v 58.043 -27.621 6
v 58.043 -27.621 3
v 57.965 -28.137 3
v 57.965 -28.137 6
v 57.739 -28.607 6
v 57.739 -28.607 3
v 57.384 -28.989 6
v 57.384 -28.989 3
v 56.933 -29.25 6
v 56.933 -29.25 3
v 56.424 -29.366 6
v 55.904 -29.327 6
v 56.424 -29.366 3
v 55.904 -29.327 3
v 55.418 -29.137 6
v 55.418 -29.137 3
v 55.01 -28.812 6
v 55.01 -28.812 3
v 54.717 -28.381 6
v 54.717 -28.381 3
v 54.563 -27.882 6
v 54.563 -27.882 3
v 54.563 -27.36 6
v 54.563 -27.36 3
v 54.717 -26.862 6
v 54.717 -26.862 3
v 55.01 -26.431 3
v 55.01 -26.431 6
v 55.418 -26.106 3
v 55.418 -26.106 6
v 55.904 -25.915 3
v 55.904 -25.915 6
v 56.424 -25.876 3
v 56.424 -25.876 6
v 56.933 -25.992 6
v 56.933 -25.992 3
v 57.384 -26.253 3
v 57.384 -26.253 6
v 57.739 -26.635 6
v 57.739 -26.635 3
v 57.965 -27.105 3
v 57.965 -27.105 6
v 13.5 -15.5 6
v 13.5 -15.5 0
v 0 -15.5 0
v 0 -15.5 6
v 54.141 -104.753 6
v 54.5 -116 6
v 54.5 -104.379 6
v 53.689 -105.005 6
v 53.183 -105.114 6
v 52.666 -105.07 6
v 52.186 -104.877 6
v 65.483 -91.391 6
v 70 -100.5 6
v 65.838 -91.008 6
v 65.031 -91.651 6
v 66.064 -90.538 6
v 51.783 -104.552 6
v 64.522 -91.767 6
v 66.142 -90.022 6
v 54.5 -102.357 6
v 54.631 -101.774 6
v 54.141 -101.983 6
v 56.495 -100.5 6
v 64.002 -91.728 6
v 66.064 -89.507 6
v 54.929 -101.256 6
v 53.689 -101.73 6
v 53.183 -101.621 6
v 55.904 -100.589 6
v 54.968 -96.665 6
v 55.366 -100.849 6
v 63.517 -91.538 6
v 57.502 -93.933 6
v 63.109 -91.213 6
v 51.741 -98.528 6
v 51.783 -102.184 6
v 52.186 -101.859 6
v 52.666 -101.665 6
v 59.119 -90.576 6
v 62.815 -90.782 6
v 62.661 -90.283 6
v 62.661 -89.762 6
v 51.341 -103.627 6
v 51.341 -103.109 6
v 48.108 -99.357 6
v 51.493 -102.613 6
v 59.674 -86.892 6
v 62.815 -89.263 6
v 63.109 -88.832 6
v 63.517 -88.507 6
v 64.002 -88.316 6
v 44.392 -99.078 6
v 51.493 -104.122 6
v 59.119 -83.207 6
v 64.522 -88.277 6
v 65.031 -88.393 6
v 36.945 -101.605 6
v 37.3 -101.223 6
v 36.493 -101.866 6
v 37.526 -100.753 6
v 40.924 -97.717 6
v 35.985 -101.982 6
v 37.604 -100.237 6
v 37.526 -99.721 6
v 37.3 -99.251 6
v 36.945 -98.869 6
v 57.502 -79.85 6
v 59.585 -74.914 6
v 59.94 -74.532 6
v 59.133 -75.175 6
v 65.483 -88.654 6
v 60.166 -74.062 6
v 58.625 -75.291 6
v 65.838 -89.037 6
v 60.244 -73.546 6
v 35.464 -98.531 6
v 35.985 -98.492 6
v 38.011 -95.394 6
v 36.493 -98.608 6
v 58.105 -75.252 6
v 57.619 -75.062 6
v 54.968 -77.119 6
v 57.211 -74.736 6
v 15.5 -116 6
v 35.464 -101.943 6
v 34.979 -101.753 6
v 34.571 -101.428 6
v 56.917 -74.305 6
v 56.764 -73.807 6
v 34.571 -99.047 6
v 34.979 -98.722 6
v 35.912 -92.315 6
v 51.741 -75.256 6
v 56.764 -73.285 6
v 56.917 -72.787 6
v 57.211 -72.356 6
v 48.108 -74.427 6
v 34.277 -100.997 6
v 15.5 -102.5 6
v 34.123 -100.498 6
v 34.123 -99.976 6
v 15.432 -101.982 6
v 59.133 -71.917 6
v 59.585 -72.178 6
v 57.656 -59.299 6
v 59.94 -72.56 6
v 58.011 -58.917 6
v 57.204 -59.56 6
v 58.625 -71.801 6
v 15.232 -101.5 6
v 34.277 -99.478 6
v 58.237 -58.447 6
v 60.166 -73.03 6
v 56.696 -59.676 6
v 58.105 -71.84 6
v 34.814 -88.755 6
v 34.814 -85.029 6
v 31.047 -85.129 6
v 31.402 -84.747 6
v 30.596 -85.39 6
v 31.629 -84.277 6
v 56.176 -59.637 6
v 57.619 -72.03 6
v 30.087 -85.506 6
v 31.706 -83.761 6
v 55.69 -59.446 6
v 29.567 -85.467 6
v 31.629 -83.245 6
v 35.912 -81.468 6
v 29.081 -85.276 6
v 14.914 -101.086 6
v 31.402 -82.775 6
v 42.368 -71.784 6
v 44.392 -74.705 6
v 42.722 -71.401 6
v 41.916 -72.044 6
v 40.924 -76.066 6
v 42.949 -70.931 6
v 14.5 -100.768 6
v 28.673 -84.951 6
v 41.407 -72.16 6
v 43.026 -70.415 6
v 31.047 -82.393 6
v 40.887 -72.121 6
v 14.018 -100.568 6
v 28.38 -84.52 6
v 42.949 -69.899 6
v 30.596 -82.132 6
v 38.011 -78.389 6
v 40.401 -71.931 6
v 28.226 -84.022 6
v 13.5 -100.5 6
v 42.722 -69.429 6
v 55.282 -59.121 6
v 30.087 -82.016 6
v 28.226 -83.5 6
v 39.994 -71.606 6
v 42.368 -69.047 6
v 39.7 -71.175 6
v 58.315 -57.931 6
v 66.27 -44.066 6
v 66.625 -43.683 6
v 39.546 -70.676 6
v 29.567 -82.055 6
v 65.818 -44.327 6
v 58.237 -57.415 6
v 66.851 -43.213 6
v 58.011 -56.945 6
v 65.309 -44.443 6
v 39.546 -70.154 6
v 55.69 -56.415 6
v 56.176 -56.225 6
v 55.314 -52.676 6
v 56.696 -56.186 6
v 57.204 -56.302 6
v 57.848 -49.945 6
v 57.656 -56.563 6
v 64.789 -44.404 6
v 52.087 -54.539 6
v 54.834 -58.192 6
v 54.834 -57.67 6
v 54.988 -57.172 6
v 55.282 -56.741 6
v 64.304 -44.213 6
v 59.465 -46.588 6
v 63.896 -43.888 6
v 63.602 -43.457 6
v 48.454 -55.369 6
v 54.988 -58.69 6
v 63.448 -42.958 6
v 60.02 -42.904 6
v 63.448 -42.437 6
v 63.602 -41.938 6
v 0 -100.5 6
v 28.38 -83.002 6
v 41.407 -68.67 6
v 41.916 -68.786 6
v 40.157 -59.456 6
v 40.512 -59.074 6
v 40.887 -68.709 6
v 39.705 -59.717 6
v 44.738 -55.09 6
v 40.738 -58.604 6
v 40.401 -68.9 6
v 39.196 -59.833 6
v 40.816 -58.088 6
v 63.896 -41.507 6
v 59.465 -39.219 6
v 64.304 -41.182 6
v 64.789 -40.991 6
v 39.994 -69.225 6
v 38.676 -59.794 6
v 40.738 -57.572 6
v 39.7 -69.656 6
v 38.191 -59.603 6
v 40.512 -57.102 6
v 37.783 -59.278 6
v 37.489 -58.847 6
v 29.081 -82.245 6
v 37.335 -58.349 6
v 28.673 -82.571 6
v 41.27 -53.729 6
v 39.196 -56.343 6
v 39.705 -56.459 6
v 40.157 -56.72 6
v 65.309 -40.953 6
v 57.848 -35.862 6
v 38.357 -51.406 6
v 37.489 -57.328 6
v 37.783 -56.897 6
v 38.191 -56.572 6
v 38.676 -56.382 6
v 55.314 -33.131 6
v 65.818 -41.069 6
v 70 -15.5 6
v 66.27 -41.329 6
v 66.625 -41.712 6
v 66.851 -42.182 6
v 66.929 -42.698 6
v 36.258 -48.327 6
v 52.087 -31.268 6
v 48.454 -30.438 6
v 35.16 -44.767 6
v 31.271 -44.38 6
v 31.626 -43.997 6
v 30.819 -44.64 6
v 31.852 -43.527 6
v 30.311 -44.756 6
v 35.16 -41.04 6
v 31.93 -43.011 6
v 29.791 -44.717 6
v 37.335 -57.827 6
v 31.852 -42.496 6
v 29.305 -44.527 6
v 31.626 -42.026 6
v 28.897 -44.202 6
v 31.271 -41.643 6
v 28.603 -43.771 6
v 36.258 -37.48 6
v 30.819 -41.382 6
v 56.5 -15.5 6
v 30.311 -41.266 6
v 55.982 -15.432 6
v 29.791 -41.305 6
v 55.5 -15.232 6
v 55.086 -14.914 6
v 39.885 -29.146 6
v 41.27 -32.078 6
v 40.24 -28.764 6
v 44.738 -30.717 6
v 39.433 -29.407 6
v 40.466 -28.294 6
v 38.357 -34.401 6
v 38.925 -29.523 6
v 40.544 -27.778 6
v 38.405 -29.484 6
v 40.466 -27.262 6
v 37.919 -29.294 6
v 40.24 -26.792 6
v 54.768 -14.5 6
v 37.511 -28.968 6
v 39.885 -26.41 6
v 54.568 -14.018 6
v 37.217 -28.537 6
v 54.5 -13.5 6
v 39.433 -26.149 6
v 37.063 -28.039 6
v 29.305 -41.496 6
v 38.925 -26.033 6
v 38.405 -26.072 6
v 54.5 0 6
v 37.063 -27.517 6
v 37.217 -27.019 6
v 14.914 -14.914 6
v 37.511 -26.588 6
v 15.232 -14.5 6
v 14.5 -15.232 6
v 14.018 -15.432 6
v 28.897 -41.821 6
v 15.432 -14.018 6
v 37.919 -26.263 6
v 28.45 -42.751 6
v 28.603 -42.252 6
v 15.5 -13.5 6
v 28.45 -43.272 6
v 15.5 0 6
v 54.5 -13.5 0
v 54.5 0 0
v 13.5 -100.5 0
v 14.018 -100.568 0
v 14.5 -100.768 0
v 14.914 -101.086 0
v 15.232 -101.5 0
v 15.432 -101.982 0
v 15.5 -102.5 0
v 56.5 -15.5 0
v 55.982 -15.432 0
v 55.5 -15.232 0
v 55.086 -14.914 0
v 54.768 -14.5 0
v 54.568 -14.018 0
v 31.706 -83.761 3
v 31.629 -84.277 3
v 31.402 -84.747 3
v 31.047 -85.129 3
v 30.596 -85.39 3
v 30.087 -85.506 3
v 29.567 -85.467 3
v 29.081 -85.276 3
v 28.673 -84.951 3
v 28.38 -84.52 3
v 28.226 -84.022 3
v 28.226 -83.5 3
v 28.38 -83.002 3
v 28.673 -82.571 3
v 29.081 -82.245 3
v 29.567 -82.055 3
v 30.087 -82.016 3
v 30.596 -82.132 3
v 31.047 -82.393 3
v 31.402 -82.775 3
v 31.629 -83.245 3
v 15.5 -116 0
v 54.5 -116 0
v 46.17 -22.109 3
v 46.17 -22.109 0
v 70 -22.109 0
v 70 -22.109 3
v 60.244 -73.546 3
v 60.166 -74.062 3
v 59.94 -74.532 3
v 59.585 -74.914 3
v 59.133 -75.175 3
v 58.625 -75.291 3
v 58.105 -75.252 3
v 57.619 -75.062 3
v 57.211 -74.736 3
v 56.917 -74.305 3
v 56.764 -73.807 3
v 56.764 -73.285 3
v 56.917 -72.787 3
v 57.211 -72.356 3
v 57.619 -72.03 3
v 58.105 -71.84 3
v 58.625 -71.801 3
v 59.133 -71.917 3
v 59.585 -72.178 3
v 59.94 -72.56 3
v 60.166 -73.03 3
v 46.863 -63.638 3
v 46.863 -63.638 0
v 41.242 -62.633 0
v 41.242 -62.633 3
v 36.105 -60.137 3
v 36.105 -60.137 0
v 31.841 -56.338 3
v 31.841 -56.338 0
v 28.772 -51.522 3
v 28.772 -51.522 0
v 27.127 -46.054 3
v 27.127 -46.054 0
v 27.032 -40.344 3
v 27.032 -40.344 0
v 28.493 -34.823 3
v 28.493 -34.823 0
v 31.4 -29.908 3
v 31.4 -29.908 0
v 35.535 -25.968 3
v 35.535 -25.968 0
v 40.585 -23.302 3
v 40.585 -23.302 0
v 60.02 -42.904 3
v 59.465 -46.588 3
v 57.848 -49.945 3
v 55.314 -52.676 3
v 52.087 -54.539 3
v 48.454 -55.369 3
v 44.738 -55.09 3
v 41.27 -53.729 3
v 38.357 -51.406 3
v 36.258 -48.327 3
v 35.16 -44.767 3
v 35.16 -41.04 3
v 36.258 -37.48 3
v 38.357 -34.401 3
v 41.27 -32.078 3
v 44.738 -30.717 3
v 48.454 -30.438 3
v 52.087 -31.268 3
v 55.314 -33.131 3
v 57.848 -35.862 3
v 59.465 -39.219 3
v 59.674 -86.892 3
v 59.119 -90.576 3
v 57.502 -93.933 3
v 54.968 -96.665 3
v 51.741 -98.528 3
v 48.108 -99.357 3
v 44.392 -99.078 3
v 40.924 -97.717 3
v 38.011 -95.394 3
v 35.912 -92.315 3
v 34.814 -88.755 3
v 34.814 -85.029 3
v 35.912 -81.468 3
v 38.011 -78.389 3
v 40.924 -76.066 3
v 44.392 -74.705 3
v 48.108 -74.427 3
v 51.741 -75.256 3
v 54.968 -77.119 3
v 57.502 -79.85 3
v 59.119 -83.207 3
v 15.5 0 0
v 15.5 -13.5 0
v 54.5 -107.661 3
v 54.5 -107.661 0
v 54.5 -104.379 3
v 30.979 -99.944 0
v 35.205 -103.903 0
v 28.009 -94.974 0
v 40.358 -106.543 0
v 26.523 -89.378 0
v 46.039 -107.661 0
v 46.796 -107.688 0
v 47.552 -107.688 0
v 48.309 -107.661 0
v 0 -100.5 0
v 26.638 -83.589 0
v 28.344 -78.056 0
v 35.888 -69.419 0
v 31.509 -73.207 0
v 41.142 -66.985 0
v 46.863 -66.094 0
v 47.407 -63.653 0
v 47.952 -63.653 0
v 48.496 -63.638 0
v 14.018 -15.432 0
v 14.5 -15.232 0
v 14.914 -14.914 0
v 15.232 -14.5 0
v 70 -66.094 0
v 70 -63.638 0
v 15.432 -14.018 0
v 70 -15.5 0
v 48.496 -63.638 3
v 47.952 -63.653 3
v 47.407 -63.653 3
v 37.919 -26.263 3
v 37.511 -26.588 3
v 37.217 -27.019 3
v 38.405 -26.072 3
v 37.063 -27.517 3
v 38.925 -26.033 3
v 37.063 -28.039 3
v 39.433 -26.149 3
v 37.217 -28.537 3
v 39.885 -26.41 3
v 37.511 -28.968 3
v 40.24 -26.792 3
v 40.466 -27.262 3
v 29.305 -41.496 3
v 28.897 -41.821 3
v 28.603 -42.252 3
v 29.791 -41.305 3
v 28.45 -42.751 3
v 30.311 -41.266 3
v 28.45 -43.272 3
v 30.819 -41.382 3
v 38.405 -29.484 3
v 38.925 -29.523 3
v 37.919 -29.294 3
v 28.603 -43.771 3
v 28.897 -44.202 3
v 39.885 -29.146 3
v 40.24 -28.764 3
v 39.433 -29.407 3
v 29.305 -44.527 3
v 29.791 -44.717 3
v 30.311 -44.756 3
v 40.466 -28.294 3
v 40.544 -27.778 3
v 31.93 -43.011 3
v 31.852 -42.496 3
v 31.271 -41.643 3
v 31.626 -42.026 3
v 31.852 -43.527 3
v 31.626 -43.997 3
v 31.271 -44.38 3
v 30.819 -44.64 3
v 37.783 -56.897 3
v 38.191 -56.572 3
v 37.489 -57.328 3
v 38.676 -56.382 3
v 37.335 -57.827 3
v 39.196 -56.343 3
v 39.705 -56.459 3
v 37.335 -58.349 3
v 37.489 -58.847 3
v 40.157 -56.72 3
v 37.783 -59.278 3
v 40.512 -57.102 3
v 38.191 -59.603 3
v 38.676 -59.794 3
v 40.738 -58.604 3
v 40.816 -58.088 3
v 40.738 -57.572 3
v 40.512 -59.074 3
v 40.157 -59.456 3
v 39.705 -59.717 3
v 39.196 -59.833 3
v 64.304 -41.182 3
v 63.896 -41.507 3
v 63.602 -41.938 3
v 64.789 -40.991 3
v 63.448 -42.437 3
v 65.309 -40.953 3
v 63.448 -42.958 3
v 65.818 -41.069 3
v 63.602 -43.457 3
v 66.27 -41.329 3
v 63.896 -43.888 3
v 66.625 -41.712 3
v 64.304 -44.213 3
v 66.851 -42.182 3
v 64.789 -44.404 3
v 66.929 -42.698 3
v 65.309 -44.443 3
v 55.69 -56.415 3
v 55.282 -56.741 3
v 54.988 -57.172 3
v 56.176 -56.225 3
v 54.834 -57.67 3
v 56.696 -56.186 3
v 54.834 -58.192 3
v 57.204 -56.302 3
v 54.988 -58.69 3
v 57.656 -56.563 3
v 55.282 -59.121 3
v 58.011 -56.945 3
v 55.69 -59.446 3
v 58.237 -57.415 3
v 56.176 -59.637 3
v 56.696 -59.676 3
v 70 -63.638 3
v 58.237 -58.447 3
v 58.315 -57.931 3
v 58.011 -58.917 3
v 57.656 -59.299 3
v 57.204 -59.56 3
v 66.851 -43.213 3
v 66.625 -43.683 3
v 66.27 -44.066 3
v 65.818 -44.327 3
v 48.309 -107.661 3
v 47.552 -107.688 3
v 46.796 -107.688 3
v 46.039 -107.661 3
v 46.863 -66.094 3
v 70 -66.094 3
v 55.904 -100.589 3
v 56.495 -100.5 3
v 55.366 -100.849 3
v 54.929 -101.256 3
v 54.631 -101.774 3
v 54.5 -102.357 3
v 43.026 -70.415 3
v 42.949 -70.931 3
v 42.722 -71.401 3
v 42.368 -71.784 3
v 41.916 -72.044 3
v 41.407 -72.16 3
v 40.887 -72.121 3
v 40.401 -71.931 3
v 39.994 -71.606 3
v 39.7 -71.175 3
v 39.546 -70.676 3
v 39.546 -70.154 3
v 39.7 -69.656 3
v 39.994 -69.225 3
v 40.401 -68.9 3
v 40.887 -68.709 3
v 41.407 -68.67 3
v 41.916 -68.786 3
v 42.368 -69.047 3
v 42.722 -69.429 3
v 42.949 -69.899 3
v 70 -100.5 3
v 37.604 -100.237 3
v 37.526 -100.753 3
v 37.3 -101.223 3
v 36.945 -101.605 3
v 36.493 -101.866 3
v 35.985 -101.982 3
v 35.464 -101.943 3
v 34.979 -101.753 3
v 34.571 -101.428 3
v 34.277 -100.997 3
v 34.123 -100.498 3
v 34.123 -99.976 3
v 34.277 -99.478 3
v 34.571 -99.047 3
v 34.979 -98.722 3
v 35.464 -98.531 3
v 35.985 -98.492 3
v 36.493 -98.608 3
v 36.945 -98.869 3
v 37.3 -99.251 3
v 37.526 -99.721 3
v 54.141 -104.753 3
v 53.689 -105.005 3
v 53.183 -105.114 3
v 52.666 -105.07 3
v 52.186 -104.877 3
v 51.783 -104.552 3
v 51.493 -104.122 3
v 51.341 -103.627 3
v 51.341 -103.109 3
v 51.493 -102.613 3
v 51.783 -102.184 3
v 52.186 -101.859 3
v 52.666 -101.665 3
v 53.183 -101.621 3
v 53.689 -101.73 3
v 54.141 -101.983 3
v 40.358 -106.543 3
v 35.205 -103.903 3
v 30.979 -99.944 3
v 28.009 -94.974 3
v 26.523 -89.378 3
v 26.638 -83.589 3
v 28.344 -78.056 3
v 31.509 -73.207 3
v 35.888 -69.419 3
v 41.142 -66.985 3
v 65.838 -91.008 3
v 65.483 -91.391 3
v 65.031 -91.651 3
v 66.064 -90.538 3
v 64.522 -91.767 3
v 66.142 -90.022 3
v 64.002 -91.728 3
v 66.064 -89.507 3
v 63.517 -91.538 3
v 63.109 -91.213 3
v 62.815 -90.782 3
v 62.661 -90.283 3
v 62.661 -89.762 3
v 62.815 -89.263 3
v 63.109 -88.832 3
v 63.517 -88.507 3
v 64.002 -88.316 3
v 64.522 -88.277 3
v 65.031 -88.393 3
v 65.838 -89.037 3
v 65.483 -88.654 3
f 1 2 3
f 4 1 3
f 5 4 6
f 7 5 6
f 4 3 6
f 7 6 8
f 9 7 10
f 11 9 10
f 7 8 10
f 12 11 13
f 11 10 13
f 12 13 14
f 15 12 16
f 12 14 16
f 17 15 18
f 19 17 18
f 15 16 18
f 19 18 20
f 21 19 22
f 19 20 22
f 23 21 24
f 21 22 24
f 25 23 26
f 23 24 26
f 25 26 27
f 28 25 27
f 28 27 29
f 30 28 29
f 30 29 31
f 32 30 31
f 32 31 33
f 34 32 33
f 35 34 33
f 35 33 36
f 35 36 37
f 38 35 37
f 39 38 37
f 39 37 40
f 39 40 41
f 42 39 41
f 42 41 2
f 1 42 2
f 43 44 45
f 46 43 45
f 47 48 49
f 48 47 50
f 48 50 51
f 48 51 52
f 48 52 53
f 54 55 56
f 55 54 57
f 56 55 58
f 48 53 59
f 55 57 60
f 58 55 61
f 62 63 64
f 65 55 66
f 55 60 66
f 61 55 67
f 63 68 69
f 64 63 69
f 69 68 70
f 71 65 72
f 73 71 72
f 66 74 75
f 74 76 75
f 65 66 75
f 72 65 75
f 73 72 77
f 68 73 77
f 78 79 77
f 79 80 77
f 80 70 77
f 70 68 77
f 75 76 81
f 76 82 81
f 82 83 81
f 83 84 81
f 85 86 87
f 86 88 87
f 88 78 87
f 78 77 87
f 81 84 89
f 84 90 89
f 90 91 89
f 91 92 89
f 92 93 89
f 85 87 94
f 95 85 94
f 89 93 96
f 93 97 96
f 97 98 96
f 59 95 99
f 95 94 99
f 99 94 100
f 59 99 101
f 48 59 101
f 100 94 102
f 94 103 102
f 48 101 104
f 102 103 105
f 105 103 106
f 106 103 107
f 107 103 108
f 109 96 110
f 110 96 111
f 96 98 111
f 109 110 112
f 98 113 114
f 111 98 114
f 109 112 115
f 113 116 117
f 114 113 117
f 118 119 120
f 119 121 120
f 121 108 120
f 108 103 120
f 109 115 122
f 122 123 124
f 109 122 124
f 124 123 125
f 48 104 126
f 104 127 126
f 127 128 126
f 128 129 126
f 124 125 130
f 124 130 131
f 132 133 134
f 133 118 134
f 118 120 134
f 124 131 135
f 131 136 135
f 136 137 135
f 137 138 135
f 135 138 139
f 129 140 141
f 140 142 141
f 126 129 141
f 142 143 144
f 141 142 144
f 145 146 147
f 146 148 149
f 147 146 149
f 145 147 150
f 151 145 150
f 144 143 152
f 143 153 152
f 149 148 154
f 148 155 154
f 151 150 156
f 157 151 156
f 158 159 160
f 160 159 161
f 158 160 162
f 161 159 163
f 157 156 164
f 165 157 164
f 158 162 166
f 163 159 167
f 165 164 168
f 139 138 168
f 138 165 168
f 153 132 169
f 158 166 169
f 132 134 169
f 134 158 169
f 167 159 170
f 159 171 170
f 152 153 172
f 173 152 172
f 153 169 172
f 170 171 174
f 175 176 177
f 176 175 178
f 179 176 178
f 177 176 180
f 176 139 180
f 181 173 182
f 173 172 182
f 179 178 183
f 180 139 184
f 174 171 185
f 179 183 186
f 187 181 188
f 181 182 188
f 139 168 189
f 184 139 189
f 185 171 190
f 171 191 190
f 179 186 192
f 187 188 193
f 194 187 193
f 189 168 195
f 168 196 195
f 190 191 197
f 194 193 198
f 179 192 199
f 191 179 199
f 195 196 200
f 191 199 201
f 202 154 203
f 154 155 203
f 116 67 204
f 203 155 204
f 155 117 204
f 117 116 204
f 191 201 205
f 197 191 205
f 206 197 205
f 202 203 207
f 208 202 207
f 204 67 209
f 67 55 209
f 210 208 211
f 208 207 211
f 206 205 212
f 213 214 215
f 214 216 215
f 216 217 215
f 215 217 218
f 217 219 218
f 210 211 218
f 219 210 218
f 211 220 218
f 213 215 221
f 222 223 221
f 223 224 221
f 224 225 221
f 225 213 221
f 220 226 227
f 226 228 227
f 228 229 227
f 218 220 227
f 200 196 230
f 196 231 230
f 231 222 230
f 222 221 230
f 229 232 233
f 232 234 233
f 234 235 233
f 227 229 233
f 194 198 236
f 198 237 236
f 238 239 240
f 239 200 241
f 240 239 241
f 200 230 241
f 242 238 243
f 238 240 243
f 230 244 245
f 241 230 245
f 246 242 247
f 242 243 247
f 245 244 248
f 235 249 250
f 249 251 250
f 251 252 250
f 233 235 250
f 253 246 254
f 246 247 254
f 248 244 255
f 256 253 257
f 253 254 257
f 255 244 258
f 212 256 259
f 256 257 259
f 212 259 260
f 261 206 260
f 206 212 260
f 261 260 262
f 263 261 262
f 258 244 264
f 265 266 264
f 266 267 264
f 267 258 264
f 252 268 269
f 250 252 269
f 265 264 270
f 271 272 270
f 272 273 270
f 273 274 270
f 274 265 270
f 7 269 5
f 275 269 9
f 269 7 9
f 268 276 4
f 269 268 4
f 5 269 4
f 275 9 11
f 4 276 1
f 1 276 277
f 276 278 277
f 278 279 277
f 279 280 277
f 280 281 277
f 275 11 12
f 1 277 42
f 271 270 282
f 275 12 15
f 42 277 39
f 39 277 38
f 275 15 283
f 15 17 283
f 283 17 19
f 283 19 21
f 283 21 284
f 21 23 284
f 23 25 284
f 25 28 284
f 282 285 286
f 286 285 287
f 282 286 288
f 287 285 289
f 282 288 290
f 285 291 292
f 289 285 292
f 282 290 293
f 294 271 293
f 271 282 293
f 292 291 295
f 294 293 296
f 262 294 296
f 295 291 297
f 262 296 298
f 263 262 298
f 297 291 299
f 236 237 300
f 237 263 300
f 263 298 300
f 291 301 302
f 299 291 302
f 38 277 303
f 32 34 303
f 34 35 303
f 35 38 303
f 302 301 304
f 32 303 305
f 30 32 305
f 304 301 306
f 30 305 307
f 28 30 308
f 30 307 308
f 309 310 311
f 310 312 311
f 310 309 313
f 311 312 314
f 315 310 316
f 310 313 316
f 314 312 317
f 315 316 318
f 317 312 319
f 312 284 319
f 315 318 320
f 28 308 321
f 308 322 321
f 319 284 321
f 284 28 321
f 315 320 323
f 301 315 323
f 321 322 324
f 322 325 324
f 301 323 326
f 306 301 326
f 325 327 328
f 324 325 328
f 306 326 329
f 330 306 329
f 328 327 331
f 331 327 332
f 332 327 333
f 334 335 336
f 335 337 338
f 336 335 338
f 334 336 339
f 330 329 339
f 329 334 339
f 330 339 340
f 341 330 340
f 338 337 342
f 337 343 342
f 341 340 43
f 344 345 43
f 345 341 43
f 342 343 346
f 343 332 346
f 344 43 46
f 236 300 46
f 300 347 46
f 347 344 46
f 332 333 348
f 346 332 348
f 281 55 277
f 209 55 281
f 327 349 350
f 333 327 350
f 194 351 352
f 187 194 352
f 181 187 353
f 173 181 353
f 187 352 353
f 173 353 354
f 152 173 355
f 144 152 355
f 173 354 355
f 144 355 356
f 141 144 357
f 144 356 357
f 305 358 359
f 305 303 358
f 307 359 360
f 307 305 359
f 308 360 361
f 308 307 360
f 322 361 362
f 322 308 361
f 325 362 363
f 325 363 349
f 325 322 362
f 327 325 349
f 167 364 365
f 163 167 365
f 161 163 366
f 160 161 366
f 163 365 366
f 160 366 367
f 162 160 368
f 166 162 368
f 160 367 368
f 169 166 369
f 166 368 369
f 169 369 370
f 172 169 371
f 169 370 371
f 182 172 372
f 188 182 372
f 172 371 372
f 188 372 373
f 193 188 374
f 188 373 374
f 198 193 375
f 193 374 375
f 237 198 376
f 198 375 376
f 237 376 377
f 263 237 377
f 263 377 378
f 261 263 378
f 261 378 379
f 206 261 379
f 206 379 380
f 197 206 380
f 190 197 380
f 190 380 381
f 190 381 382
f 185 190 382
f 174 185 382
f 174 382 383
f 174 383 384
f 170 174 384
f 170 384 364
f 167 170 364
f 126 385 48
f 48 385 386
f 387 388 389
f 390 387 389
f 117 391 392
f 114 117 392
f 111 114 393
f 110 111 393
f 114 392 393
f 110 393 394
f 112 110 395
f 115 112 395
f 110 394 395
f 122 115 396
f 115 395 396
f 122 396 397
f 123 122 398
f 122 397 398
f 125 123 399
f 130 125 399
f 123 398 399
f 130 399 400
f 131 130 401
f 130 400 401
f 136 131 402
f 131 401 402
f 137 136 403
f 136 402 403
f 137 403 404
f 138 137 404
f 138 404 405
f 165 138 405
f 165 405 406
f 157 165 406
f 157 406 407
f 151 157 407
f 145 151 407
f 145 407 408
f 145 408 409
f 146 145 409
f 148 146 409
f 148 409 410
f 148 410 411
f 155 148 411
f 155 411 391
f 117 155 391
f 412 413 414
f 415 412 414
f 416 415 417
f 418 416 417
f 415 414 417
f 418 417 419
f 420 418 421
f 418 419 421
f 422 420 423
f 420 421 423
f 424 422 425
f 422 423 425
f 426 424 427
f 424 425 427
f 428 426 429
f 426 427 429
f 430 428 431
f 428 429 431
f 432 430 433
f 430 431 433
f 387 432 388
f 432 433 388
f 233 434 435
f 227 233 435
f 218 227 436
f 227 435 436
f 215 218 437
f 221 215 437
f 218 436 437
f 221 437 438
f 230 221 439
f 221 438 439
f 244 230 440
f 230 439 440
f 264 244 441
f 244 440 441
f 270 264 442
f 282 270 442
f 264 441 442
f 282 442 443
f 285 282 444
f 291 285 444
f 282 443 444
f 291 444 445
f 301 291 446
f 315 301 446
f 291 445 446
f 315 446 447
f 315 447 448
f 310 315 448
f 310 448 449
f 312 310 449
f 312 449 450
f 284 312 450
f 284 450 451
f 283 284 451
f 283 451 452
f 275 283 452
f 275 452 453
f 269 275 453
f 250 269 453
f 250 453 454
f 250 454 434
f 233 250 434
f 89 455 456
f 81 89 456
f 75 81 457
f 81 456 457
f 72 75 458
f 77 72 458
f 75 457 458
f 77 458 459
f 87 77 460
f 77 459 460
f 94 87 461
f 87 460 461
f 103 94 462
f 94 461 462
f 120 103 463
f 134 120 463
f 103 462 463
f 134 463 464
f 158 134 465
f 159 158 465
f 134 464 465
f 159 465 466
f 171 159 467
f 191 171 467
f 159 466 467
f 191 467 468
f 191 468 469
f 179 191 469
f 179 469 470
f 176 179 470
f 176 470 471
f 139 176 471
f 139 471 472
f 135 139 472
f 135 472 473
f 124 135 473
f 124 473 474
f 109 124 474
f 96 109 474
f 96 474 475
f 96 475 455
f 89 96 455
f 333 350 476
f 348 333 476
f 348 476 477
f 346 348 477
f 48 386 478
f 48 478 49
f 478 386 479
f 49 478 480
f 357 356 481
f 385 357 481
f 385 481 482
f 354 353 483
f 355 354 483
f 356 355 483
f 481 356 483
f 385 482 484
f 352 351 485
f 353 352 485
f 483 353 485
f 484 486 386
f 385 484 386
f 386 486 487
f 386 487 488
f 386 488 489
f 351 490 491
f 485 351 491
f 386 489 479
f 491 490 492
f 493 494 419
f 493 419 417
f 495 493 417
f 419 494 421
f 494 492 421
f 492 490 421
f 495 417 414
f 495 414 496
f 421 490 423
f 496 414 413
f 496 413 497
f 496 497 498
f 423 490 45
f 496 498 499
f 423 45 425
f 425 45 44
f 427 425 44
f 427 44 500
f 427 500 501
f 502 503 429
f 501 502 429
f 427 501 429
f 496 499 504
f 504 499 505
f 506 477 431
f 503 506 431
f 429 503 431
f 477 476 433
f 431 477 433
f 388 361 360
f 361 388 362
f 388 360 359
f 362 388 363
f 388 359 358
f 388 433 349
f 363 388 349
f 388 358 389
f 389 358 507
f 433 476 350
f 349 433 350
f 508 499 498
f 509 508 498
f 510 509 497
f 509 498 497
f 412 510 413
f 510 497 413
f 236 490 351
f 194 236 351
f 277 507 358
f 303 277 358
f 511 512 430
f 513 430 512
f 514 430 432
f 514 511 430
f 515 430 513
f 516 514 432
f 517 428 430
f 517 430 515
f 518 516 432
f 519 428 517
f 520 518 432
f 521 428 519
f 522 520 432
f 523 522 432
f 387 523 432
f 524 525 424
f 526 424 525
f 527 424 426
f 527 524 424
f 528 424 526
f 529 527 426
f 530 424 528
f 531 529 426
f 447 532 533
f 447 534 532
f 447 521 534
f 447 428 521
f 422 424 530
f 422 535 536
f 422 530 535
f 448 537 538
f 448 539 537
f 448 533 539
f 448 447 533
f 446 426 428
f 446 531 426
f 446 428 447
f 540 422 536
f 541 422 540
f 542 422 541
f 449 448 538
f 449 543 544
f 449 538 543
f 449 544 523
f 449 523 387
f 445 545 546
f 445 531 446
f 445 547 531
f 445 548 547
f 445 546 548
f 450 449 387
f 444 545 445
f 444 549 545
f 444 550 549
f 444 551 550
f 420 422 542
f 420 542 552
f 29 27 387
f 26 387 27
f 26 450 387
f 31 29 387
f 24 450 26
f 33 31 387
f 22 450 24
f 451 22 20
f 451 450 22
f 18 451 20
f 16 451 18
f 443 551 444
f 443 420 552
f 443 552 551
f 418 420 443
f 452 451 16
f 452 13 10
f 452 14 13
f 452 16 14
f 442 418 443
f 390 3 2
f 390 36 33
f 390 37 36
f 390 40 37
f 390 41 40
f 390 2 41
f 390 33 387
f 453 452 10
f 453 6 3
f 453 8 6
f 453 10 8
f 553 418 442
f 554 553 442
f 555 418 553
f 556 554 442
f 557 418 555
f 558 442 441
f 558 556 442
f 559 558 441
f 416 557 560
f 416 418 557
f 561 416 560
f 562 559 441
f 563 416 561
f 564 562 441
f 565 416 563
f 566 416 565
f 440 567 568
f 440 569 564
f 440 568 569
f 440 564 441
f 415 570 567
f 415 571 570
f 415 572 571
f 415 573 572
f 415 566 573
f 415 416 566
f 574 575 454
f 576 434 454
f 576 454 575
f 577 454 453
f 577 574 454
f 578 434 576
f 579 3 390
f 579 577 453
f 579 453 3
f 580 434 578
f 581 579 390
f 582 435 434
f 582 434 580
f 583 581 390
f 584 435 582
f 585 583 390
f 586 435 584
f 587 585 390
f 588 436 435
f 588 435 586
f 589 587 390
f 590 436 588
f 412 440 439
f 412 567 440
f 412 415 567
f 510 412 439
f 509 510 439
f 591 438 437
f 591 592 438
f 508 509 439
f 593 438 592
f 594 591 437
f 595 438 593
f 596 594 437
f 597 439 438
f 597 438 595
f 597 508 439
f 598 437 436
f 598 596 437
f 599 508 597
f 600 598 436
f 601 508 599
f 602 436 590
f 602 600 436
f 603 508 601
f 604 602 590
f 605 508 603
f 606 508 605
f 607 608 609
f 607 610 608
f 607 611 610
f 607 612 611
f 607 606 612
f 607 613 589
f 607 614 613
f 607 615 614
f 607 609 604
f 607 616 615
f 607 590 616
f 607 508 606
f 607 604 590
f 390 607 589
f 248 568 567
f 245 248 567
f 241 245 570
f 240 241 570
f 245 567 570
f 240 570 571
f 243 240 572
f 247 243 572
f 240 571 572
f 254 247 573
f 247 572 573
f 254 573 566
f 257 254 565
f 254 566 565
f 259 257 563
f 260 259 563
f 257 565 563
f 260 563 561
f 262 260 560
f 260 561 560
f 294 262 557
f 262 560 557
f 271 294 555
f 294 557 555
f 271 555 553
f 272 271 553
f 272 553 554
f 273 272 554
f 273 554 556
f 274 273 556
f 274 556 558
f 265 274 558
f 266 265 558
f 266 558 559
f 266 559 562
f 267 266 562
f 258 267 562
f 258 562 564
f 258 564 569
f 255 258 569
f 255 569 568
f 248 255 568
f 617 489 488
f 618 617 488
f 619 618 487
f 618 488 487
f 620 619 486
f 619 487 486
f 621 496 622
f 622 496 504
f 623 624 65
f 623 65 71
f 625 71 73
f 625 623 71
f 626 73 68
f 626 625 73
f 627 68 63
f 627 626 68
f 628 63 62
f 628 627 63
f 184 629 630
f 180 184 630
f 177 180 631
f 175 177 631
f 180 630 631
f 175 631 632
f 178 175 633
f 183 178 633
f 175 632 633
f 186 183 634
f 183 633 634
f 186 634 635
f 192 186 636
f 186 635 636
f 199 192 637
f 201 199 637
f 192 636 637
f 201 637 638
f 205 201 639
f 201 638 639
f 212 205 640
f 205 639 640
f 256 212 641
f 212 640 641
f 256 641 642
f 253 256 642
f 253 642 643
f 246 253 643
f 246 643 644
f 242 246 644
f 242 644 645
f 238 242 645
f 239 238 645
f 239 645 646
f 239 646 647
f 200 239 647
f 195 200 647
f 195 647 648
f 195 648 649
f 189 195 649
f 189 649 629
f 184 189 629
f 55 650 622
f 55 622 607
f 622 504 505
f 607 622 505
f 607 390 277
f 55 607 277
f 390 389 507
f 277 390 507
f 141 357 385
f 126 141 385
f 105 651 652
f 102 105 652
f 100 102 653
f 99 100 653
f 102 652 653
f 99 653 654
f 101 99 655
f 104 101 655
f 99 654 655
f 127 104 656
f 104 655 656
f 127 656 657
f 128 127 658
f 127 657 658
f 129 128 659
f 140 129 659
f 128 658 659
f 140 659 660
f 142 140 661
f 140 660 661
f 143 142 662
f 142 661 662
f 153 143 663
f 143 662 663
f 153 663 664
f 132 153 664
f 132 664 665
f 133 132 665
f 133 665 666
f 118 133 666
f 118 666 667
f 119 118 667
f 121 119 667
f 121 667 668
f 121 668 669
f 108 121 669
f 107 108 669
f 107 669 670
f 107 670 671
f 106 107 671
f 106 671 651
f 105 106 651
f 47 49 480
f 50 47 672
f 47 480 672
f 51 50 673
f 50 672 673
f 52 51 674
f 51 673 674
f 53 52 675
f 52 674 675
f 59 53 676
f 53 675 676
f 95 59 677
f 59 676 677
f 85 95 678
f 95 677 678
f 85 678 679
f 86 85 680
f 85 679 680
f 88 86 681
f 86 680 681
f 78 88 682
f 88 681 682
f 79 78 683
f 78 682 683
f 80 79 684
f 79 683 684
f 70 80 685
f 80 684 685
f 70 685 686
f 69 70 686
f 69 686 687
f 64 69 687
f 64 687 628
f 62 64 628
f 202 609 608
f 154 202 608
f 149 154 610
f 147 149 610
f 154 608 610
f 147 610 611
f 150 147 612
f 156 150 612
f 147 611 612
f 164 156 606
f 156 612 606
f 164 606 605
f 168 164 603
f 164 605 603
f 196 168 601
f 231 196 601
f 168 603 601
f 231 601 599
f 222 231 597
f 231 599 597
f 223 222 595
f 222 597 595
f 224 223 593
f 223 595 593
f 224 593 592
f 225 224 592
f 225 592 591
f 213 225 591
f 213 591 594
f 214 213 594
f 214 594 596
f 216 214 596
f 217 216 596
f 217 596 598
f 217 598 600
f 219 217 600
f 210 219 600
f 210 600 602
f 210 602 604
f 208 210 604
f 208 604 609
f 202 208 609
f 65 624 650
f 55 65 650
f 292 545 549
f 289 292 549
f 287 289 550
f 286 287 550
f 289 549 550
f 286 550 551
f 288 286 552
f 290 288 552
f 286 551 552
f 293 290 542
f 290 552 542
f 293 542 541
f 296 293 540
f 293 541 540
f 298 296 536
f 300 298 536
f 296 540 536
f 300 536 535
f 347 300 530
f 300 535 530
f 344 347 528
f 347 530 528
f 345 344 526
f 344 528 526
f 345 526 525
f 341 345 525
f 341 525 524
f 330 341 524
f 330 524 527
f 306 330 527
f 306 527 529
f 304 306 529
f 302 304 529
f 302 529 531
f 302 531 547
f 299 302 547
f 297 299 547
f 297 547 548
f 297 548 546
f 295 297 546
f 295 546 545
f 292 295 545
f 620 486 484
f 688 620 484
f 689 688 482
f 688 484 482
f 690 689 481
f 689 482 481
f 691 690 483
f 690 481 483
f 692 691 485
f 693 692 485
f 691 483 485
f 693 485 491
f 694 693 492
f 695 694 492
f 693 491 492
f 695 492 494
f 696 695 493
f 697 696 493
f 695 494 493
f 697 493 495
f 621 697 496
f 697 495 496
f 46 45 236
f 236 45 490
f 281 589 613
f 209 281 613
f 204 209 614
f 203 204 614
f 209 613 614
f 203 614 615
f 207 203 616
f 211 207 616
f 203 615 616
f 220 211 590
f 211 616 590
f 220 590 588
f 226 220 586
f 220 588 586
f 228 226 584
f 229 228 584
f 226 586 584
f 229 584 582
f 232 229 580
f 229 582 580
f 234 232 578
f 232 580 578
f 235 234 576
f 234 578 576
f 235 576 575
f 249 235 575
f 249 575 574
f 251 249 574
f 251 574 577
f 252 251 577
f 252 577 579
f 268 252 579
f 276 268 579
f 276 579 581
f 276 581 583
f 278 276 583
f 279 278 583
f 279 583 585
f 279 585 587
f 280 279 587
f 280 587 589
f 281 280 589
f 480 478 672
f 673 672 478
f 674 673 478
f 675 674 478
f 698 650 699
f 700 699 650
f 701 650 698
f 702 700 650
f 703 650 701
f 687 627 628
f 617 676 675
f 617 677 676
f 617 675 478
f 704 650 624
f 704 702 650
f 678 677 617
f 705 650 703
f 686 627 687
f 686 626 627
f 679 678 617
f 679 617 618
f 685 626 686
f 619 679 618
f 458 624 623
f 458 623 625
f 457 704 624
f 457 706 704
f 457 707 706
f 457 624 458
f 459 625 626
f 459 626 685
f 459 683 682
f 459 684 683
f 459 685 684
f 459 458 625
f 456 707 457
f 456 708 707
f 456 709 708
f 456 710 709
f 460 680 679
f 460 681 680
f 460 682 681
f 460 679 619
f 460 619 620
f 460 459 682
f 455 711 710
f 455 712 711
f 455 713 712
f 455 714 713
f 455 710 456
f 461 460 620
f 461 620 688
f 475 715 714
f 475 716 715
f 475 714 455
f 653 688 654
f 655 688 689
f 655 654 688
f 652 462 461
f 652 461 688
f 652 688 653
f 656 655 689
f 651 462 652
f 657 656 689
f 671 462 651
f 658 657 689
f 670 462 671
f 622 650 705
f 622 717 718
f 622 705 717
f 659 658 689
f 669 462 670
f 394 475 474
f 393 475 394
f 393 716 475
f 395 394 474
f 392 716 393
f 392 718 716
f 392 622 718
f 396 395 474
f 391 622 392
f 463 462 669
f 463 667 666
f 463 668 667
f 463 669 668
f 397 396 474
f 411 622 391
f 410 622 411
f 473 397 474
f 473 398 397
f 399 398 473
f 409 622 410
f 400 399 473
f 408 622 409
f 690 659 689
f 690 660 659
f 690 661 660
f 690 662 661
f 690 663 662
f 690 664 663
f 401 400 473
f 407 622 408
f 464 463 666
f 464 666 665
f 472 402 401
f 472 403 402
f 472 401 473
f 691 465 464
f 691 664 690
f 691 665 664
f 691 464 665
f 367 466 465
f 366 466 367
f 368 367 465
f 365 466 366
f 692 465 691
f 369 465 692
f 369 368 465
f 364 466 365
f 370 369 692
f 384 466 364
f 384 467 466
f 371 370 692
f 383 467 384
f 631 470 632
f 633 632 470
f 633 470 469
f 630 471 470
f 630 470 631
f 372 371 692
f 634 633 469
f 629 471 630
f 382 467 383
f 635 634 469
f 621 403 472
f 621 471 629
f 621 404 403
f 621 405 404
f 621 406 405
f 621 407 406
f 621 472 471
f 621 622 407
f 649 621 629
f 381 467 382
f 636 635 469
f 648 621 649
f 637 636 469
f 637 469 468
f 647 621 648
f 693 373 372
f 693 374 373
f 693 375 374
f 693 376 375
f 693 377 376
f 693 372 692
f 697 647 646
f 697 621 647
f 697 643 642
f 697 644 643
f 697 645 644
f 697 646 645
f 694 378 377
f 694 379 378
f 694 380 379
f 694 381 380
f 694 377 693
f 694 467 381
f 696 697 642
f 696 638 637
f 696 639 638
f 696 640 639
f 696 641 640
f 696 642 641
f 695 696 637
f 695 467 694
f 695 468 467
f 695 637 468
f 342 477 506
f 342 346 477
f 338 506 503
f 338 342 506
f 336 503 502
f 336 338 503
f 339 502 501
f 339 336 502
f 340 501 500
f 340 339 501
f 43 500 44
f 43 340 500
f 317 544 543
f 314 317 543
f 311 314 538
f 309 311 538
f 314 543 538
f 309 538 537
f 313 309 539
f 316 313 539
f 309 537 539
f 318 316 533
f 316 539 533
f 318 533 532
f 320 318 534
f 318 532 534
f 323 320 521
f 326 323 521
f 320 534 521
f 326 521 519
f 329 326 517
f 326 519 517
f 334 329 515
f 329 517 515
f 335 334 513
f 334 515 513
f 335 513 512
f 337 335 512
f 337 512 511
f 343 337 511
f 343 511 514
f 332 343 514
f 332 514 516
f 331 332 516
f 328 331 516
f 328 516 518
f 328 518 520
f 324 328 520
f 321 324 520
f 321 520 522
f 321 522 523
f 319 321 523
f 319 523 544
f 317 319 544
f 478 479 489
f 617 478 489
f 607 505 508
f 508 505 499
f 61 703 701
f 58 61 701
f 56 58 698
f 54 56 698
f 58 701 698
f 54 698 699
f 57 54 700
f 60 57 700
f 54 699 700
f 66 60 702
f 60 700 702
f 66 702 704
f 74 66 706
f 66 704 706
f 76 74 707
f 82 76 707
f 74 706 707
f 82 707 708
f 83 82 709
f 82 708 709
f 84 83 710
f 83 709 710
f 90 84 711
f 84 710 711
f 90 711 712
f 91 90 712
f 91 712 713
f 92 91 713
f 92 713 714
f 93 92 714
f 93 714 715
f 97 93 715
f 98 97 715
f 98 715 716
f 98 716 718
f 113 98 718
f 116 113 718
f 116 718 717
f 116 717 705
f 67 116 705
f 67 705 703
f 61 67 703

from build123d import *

# Parameters (mm, degrees)
F1_DEPTH     = 6
F3_DEPTH     = 3
F4_R         = 12.5
F5_DEPTH     = 25
F6_R         = 1.75
F7_DEPTH     = 25
F8_R         = 1.75
F9_DEPTH     = 25
F10_T1_DEPTH = 6
F10_T3_DEPTH = 3
F11_R        = 2


# Not quite as in the source:
# - a fillet or chamfer that OpenCascade refuses, or shapes differently, is made with other operations: its cross-section is extruded or revolved along the edge and cut away or added


with BuildPart() as f1:
    # F0 (on Top) → F1 (new body)
    with BuildSketch(Plane.XY):
        Polygon((15.5, -15.5), (0, -15.5), (0, -100.5), (15.5, -100.5), (15.5, -116), (54.5, -116), (54.5, -100.5), (70, -100.5), (70, -15.5), (54.5, -15.5), (54.5, 0), (15.5, 0), align=None)
    extrude(amount=F1_DEPTH)

    # F2 (on face) → F3 (cut)
    with BuildSketch(Plane(origin=(0, 0, 0), x_dir=(1, 0, 0), z_dir=(0, 0, -1))):
        with BuildLine():
            Line((46.0390912639, 107.6606247352), (48.3088987836, 107.6606247352))
            ThreePointArc((48.3088987836, 107.6606247352), (47.1739950237, 107.6916095092), (46.0390912639, 107.6606247352))
        make_face()
        with BuildLine():
            Line((46.863162711, 63.6384694919), (48.4956821186, 63.6384694919))
            ThreePointArc((48.4956821186, 63.6384694919), (47.6794224148, 63.6544920069), (46.863162711, 63.6384694919))
        make_face()
        with BuildLine():
            Line((54.5, 107.6606247352), (48.3088987836, 107.6606247352))
            Line((48.3088987836, 107.6606247352), (46.0390912639, 107.6606247352))
            ThreePointArc((46.0390912639, 107.6606247352), (26.3780814544, 86.4793246358), (46.863162711, 66.0939321564))
            Line((46.863162711, 66.0939321564), (70, 66.0939321564))
            Line((70, 66.0939321564), (70, 100.5))
            Line((70, 100.5), (54.5, 100.5))
            Line((54.5, 100.5), (54.5, 107.6606247352))
        make_face()
        with BuildLine():
            Line((70, 22.1093658845), (70, 63.6384694919))
            Line((70, 63.6384694919), (48.4956821186, 63.6384694919))
            Line((48.4956821186, 63.6384694919), (46.863162711, 63.6384694919))
            ThreePointArc((46.863162711, 63.6384694919), (26.8823229814, 43.2018465212), (46.1695409076, 22.1093658845))
            Line((46.1695409076, 22.1093658845), (70, 22.1093658845))
        make_face()
    extrude(amount=-F3_DEPTH, mode=Mode.SUBTRACT)

    # F4 (on face) → F5 (cut)
    with BuildSketch(Plane(origin=(0, 0, 3), x_dir=(1, 0, 0), z_dir=(0, 0, -1))):
        with Locations((47.51990363, 42.9035276175)):
            Circle(F4_R)
        with Locations((47.1739950237, 86.8916095092)):
            Circle(F4_R)
    extrude(amount=-F5_DEPTH, mode=Mode.SUBTRACT)

    # F6 (on face) → F7 (cut)
    with BuildSketch(Plane(origin=(0, 0, 3), x_dir=(1, 0, 0), z_dir=(0, 0, -1))):
        with Locations((39.0656358559, 58.0877674629)):
            Circle(F6_R)
        with Locations((30.1801256076, 43.0113717521)):
            Circle(F6_R)
        with Locations((38.7939121665, 27.7780962961)):
            Circle(F6_R)
        with Locations((56.2932089737, 27.6212165509)):
            Circle(F6_R)
        with Locations((65.178719222, 42.6976122617)):
            Circle(F6_R)
        with Locations((56.5649326631, 57.9308877176)):
            Circle(F6_R)
    extrude(amount=-F7_DEPTH, mode=Mode.SUBTRACT)

    # F8 (on face) → F9 (cut)
    with BuildSketch(Plane(origin=(0, 0, 3), x_dir=(1, 0, 0), z_dir=(0, 0, -1))):
        with Locations((35.8538748382, 100.2372035006)):
            Circle(F8_R)
        with Locations((29.9563115058, 83.7608948503)):
            Circle(F8_R)
        with Locations((41.2764316914, 70.4153008589)):
            Circle(F8_R)
        with Locations((58.4941152093, 73.5460155178)):
            Circle(F8_R)
        with Locations((64.3916785417, 90.0223241681)):
            Circle(F8_R)
        with Locations((53.0715583561, 103.3679181595)):
            Circle(F8_R)
    extrude(amount=-F9_DEPTH, mode=Mode.SUBTRACT)

    # F10: fillet of radius 2 on 2 edges, made by hand

    # F10_s2 → F10_t1 (join)
    with BuildSketch(Plane.XY):
        with BuildLine():
            ThreePointArc((13.5, -100.5), (14.9142135624, -101.0857864376), (15.5, -102.5))
            Line((15.5, -102.5), (15.5, -100.5))
            Line((15.5, -100.5), (13.5, -100.5))
        make_face()
    extrude(amount=F10_T1_DEPTH)

    # F10_s4 → F10_t3 (join)
    with BuildSketch(Plane.XY.offset(3)):
        with BuildLine():
            ThreePointArc((56.4948776909, -100.5), (55.1321777741, -101.0360843819), (54.5, -102.3569510631))
            Line((54.5, -102.3569510631), (54.5, -100.5))
            Line((54.5, -100.5), (56.4948776909, -100.5))
        make_face()
    extrude(amount=F10_T3_DEPTH)

    # F11
    f11_edges = [f1.edges().sort_by_distance(p)[0] for p in [
        (54.5, -15.5, 3),
        (15.5, -15.5, 3),
    ]]
    fillet(f11_edges, radius=F11_R)


solid = f1.part
